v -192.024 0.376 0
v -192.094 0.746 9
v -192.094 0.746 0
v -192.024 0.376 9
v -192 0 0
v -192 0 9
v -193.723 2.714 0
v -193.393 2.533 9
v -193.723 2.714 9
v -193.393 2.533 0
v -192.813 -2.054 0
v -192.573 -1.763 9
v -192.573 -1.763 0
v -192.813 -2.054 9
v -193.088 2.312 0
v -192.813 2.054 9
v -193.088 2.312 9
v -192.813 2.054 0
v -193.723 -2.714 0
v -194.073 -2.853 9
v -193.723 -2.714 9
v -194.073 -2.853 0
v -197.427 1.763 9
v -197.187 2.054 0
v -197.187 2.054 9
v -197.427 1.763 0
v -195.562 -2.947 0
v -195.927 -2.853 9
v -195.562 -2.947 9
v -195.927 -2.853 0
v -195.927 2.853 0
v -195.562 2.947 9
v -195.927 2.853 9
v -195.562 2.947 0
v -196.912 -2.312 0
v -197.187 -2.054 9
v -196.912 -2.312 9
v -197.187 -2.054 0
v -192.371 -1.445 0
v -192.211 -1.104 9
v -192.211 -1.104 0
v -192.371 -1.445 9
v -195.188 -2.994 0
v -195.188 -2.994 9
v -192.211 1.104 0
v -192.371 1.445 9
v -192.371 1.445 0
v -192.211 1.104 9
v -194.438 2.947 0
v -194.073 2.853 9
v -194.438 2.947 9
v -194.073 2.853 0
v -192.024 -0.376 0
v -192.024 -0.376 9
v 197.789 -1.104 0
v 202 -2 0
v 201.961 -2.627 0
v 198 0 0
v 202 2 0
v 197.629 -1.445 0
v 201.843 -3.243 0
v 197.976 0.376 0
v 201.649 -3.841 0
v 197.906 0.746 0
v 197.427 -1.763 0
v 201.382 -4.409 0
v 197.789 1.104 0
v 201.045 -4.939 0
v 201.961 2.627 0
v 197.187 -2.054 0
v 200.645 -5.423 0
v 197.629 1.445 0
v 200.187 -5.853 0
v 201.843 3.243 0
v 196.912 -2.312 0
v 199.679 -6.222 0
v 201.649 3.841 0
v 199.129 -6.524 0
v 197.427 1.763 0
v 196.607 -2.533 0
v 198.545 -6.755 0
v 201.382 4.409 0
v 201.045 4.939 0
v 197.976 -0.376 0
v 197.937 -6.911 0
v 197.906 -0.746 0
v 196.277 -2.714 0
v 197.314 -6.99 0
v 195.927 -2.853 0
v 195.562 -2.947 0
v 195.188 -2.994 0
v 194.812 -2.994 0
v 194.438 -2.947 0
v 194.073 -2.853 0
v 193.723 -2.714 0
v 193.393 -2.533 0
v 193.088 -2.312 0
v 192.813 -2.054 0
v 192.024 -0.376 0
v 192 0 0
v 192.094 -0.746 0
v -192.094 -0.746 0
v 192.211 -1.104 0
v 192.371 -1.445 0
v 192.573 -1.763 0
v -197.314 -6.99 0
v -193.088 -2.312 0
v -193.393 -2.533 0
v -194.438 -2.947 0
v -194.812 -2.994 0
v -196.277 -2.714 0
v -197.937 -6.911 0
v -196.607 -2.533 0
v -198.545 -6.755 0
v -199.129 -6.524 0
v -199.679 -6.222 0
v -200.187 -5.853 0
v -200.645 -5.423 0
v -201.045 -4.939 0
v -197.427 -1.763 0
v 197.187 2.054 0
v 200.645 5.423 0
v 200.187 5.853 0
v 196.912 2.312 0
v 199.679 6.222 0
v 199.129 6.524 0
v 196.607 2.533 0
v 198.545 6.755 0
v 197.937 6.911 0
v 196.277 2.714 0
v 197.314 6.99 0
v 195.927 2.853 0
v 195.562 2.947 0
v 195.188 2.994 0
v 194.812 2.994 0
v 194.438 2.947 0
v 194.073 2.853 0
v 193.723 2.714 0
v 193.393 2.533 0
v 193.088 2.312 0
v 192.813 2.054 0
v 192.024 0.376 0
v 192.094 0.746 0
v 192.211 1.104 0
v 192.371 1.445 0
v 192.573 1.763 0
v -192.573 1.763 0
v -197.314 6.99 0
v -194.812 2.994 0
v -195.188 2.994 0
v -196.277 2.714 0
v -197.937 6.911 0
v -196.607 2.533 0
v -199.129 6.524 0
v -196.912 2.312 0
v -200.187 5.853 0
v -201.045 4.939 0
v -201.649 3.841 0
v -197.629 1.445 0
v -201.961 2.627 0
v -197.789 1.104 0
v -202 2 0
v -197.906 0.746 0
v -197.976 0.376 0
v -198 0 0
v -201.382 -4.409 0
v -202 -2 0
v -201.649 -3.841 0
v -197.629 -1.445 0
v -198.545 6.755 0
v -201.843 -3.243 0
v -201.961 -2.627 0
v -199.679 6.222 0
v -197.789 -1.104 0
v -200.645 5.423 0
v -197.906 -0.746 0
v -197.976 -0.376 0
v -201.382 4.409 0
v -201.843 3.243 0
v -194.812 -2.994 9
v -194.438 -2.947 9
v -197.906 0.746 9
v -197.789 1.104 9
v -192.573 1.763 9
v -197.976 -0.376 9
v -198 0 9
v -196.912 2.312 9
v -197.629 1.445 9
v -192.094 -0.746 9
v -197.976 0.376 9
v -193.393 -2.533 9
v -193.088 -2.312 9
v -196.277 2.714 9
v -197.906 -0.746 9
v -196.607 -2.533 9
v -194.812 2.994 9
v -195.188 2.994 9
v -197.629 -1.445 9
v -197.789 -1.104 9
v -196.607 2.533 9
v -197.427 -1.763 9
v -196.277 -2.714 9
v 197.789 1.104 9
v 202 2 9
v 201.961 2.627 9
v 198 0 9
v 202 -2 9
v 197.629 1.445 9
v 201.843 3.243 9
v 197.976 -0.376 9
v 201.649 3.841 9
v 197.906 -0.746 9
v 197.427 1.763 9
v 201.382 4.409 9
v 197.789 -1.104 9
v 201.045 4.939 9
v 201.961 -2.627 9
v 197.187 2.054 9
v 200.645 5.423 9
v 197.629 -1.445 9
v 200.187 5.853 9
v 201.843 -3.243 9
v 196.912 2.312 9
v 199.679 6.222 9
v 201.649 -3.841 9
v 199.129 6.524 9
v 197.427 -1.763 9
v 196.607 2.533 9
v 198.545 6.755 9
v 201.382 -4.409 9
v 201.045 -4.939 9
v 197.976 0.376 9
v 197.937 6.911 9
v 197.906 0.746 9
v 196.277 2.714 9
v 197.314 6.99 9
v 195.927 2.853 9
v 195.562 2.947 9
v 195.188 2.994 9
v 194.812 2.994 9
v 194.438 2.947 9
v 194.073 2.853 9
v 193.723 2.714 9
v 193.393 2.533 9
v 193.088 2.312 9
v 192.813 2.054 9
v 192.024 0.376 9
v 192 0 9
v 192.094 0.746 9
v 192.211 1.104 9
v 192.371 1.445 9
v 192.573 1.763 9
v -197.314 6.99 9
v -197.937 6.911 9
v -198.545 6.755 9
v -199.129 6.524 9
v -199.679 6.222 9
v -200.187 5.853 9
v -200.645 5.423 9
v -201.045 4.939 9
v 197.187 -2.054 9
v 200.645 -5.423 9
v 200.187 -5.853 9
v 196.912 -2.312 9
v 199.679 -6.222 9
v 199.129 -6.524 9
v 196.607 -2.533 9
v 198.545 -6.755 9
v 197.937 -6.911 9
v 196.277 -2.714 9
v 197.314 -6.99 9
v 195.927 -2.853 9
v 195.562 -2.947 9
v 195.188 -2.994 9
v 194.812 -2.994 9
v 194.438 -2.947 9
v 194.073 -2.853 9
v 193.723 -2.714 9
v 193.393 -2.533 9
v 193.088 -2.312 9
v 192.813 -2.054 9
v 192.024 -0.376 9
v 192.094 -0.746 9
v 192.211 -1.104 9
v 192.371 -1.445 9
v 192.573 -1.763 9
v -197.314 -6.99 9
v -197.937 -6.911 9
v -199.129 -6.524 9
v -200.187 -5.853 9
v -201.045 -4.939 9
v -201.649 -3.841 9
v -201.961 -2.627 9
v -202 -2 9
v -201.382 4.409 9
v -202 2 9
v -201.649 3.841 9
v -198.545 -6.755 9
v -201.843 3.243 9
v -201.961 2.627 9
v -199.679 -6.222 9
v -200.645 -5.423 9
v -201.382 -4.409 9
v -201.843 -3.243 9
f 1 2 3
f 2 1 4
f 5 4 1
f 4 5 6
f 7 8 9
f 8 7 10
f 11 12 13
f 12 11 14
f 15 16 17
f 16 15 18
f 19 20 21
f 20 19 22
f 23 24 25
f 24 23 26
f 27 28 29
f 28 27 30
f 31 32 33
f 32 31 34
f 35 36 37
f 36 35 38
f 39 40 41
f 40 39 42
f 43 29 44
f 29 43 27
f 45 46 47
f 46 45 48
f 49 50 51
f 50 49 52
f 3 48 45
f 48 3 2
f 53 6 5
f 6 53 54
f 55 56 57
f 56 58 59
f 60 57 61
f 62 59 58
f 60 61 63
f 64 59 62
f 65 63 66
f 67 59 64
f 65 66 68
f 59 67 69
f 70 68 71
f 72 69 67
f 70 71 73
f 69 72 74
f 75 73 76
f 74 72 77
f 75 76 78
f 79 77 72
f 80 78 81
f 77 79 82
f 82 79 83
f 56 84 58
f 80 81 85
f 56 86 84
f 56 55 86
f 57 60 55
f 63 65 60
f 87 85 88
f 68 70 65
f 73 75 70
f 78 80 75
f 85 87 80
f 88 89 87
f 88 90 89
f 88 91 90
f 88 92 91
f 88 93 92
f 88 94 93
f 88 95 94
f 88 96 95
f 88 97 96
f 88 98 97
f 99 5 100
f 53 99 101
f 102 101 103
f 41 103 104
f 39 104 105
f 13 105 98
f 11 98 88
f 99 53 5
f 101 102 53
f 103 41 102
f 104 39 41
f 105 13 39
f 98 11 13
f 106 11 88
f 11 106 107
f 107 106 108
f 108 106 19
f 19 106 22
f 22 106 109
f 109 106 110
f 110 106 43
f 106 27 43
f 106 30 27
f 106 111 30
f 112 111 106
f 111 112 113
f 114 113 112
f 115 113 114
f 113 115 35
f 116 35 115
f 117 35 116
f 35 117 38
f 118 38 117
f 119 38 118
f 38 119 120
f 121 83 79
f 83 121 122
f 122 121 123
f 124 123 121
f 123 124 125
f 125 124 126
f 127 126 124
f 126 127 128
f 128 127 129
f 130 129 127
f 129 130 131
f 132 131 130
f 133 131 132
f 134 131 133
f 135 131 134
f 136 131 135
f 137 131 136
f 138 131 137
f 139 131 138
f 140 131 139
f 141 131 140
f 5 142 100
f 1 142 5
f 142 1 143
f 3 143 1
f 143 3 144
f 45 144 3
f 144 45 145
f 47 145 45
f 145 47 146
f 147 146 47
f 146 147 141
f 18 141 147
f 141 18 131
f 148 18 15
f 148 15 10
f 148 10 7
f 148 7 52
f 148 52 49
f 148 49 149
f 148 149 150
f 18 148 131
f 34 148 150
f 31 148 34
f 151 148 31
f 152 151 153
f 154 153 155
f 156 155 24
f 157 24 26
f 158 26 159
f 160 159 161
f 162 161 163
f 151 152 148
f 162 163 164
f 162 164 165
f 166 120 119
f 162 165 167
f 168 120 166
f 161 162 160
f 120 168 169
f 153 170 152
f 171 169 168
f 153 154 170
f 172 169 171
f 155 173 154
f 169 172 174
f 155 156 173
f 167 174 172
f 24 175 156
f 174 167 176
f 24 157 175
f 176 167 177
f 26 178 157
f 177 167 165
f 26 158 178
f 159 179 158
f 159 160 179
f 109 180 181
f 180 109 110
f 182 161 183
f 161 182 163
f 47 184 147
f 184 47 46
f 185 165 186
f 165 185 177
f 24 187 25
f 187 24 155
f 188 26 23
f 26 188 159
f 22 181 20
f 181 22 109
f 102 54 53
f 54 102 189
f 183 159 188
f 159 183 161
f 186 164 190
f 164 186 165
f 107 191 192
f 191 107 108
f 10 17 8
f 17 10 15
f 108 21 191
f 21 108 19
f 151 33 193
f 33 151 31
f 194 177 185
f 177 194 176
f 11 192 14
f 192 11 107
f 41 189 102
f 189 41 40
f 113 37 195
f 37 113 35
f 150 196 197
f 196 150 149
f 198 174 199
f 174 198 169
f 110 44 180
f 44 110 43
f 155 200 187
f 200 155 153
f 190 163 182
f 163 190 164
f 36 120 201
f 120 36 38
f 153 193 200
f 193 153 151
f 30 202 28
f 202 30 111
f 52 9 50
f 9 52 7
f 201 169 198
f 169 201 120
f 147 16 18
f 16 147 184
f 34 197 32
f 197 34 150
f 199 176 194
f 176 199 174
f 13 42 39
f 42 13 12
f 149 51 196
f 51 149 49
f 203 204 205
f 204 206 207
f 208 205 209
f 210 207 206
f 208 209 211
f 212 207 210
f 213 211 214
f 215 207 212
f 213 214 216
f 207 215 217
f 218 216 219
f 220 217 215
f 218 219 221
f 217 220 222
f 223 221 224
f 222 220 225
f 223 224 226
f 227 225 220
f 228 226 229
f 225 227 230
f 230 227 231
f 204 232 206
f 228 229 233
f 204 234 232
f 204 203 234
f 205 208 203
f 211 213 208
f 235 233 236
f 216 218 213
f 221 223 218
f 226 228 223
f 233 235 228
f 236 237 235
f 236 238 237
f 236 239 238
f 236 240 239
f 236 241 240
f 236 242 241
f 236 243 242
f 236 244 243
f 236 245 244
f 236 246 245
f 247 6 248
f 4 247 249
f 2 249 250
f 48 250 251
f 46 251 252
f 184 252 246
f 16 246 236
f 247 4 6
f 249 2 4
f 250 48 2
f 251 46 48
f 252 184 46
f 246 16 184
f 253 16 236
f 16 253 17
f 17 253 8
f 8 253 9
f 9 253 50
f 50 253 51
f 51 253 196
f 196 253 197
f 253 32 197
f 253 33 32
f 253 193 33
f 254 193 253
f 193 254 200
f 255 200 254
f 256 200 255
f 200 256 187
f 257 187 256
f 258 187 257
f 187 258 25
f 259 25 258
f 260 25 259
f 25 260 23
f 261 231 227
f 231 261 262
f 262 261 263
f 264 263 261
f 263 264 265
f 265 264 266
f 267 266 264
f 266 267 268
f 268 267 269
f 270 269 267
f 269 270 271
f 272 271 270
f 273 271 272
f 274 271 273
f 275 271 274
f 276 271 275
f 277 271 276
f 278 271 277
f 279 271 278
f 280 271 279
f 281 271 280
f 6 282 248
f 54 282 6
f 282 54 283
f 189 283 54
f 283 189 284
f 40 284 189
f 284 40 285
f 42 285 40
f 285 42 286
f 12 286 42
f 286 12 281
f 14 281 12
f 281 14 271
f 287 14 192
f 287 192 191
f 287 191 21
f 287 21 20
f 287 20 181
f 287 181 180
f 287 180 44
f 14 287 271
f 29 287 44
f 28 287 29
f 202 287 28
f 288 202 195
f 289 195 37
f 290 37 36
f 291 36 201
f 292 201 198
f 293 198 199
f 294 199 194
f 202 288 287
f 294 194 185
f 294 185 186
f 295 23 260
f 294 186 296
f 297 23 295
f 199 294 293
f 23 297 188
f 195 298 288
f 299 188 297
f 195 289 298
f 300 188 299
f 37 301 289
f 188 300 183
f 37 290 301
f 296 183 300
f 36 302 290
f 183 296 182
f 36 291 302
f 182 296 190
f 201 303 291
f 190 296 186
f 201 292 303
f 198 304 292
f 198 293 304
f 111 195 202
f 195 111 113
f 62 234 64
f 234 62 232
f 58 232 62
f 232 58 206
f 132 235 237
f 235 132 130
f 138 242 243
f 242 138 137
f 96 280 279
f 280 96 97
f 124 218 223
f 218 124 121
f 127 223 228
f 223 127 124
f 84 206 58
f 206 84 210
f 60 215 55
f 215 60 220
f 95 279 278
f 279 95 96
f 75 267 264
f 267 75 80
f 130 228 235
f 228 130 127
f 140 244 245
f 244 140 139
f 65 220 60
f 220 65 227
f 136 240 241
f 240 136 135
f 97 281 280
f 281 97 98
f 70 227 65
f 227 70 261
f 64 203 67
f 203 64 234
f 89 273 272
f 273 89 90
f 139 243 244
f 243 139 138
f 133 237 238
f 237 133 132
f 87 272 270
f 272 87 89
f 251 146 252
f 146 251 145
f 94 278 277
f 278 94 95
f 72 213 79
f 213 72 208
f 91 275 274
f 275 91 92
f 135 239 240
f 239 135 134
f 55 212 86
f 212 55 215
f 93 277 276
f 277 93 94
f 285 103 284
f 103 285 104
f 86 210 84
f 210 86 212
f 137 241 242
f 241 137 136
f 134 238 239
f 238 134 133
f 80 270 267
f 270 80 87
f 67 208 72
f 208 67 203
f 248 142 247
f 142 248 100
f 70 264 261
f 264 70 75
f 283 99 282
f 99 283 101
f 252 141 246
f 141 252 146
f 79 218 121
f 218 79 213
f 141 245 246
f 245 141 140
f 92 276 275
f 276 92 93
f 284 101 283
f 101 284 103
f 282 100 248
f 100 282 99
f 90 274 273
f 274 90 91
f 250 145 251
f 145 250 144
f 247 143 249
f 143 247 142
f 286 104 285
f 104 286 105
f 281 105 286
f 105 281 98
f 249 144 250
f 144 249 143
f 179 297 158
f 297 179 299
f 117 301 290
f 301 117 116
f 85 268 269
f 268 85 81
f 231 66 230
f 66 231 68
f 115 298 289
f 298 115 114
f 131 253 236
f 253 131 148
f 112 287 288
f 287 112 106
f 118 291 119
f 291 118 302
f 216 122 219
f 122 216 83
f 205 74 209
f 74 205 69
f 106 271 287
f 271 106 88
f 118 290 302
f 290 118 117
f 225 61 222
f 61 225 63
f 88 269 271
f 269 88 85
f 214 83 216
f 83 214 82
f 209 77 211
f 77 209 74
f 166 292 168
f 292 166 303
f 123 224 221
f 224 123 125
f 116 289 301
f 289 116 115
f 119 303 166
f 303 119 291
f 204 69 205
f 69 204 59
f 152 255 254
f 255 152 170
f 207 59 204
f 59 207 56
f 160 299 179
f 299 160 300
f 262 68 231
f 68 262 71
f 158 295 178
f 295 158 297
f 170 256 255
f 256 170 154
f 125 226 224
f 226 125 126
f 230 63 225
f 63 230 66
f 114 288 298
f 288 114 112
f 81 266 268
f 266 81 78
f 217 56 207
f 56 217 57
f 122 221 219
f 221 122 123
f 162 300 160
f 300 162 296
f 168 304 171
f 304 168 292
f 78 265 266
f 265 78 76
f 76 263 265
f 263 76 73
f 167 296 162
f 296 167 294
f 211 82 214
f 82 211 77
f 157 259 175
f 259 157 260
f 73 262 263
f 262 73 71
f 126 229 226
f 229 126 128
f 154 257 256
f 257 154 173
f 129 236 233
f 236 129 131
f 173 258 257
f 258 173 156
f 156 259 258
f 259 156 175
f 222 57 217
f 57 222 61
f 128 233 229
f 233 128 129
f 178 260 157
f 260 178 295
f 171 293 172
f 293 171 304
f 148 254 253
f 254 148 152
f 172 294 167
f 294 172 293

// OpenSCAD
$fn = 50;


difference() {
	union() {
		hull() {
			translate(v = [-197.0000000000, 2.0000000000, 0]) {
				cylinder(h = 9, r = 5);
			}
			translate(v = [197.0000000000, 2.0000000000, 0]) {
				cylinder(h = 9, r = 5);
			}
			translate(v = [-197.0000000000, -2.0000000000, 0]) {
				cylinder(h = 9, r = 5);
			}
			translate(v = [197.0000000000, -2.0000000000, 0]) {
				cylinder(h = 9, r = 5);
			}
		}
	}
	union() {
		translate(v = [-195.0000000000, 0.0000000000, 0]) {
			cylinder(h = 9, r = 3.0000000000);
		}
		translate(v = [195.0000000000, 0.0000000000, 0]) {
			cylinder(h = 9, r = 3.0000000000);
		}
		translate(v = [-195.0000000000, 0.0000000000, 0]) {
			cylinder(h = 9, r = 1.5000000000);
		}
		translate(v = [195.0000000000, 0.0000000000, 0]) {
			cylinder(h = 9, r = 1.5000000000);
		}
		translate(v = [-195.0000000000, 0.0000000000, 0]) {
			cylinder(h = 9, r = 1.5000000000);
		}
		translate(v = [195.0000000000, 0.0000000000, 0]) {
			cylinder(h = 9, r = 1.5000000000);
		}
		translate(v = [-195.0000000000, 0.0000000000, 0]) {
			cylinder(h = 9, r = 1.5000000000);
		}
		translate(v = [195.0000000000, 0.0000000000, 0]) {
			cylinder(h = 9, r = 1.5000000000);
		}
	}
}
